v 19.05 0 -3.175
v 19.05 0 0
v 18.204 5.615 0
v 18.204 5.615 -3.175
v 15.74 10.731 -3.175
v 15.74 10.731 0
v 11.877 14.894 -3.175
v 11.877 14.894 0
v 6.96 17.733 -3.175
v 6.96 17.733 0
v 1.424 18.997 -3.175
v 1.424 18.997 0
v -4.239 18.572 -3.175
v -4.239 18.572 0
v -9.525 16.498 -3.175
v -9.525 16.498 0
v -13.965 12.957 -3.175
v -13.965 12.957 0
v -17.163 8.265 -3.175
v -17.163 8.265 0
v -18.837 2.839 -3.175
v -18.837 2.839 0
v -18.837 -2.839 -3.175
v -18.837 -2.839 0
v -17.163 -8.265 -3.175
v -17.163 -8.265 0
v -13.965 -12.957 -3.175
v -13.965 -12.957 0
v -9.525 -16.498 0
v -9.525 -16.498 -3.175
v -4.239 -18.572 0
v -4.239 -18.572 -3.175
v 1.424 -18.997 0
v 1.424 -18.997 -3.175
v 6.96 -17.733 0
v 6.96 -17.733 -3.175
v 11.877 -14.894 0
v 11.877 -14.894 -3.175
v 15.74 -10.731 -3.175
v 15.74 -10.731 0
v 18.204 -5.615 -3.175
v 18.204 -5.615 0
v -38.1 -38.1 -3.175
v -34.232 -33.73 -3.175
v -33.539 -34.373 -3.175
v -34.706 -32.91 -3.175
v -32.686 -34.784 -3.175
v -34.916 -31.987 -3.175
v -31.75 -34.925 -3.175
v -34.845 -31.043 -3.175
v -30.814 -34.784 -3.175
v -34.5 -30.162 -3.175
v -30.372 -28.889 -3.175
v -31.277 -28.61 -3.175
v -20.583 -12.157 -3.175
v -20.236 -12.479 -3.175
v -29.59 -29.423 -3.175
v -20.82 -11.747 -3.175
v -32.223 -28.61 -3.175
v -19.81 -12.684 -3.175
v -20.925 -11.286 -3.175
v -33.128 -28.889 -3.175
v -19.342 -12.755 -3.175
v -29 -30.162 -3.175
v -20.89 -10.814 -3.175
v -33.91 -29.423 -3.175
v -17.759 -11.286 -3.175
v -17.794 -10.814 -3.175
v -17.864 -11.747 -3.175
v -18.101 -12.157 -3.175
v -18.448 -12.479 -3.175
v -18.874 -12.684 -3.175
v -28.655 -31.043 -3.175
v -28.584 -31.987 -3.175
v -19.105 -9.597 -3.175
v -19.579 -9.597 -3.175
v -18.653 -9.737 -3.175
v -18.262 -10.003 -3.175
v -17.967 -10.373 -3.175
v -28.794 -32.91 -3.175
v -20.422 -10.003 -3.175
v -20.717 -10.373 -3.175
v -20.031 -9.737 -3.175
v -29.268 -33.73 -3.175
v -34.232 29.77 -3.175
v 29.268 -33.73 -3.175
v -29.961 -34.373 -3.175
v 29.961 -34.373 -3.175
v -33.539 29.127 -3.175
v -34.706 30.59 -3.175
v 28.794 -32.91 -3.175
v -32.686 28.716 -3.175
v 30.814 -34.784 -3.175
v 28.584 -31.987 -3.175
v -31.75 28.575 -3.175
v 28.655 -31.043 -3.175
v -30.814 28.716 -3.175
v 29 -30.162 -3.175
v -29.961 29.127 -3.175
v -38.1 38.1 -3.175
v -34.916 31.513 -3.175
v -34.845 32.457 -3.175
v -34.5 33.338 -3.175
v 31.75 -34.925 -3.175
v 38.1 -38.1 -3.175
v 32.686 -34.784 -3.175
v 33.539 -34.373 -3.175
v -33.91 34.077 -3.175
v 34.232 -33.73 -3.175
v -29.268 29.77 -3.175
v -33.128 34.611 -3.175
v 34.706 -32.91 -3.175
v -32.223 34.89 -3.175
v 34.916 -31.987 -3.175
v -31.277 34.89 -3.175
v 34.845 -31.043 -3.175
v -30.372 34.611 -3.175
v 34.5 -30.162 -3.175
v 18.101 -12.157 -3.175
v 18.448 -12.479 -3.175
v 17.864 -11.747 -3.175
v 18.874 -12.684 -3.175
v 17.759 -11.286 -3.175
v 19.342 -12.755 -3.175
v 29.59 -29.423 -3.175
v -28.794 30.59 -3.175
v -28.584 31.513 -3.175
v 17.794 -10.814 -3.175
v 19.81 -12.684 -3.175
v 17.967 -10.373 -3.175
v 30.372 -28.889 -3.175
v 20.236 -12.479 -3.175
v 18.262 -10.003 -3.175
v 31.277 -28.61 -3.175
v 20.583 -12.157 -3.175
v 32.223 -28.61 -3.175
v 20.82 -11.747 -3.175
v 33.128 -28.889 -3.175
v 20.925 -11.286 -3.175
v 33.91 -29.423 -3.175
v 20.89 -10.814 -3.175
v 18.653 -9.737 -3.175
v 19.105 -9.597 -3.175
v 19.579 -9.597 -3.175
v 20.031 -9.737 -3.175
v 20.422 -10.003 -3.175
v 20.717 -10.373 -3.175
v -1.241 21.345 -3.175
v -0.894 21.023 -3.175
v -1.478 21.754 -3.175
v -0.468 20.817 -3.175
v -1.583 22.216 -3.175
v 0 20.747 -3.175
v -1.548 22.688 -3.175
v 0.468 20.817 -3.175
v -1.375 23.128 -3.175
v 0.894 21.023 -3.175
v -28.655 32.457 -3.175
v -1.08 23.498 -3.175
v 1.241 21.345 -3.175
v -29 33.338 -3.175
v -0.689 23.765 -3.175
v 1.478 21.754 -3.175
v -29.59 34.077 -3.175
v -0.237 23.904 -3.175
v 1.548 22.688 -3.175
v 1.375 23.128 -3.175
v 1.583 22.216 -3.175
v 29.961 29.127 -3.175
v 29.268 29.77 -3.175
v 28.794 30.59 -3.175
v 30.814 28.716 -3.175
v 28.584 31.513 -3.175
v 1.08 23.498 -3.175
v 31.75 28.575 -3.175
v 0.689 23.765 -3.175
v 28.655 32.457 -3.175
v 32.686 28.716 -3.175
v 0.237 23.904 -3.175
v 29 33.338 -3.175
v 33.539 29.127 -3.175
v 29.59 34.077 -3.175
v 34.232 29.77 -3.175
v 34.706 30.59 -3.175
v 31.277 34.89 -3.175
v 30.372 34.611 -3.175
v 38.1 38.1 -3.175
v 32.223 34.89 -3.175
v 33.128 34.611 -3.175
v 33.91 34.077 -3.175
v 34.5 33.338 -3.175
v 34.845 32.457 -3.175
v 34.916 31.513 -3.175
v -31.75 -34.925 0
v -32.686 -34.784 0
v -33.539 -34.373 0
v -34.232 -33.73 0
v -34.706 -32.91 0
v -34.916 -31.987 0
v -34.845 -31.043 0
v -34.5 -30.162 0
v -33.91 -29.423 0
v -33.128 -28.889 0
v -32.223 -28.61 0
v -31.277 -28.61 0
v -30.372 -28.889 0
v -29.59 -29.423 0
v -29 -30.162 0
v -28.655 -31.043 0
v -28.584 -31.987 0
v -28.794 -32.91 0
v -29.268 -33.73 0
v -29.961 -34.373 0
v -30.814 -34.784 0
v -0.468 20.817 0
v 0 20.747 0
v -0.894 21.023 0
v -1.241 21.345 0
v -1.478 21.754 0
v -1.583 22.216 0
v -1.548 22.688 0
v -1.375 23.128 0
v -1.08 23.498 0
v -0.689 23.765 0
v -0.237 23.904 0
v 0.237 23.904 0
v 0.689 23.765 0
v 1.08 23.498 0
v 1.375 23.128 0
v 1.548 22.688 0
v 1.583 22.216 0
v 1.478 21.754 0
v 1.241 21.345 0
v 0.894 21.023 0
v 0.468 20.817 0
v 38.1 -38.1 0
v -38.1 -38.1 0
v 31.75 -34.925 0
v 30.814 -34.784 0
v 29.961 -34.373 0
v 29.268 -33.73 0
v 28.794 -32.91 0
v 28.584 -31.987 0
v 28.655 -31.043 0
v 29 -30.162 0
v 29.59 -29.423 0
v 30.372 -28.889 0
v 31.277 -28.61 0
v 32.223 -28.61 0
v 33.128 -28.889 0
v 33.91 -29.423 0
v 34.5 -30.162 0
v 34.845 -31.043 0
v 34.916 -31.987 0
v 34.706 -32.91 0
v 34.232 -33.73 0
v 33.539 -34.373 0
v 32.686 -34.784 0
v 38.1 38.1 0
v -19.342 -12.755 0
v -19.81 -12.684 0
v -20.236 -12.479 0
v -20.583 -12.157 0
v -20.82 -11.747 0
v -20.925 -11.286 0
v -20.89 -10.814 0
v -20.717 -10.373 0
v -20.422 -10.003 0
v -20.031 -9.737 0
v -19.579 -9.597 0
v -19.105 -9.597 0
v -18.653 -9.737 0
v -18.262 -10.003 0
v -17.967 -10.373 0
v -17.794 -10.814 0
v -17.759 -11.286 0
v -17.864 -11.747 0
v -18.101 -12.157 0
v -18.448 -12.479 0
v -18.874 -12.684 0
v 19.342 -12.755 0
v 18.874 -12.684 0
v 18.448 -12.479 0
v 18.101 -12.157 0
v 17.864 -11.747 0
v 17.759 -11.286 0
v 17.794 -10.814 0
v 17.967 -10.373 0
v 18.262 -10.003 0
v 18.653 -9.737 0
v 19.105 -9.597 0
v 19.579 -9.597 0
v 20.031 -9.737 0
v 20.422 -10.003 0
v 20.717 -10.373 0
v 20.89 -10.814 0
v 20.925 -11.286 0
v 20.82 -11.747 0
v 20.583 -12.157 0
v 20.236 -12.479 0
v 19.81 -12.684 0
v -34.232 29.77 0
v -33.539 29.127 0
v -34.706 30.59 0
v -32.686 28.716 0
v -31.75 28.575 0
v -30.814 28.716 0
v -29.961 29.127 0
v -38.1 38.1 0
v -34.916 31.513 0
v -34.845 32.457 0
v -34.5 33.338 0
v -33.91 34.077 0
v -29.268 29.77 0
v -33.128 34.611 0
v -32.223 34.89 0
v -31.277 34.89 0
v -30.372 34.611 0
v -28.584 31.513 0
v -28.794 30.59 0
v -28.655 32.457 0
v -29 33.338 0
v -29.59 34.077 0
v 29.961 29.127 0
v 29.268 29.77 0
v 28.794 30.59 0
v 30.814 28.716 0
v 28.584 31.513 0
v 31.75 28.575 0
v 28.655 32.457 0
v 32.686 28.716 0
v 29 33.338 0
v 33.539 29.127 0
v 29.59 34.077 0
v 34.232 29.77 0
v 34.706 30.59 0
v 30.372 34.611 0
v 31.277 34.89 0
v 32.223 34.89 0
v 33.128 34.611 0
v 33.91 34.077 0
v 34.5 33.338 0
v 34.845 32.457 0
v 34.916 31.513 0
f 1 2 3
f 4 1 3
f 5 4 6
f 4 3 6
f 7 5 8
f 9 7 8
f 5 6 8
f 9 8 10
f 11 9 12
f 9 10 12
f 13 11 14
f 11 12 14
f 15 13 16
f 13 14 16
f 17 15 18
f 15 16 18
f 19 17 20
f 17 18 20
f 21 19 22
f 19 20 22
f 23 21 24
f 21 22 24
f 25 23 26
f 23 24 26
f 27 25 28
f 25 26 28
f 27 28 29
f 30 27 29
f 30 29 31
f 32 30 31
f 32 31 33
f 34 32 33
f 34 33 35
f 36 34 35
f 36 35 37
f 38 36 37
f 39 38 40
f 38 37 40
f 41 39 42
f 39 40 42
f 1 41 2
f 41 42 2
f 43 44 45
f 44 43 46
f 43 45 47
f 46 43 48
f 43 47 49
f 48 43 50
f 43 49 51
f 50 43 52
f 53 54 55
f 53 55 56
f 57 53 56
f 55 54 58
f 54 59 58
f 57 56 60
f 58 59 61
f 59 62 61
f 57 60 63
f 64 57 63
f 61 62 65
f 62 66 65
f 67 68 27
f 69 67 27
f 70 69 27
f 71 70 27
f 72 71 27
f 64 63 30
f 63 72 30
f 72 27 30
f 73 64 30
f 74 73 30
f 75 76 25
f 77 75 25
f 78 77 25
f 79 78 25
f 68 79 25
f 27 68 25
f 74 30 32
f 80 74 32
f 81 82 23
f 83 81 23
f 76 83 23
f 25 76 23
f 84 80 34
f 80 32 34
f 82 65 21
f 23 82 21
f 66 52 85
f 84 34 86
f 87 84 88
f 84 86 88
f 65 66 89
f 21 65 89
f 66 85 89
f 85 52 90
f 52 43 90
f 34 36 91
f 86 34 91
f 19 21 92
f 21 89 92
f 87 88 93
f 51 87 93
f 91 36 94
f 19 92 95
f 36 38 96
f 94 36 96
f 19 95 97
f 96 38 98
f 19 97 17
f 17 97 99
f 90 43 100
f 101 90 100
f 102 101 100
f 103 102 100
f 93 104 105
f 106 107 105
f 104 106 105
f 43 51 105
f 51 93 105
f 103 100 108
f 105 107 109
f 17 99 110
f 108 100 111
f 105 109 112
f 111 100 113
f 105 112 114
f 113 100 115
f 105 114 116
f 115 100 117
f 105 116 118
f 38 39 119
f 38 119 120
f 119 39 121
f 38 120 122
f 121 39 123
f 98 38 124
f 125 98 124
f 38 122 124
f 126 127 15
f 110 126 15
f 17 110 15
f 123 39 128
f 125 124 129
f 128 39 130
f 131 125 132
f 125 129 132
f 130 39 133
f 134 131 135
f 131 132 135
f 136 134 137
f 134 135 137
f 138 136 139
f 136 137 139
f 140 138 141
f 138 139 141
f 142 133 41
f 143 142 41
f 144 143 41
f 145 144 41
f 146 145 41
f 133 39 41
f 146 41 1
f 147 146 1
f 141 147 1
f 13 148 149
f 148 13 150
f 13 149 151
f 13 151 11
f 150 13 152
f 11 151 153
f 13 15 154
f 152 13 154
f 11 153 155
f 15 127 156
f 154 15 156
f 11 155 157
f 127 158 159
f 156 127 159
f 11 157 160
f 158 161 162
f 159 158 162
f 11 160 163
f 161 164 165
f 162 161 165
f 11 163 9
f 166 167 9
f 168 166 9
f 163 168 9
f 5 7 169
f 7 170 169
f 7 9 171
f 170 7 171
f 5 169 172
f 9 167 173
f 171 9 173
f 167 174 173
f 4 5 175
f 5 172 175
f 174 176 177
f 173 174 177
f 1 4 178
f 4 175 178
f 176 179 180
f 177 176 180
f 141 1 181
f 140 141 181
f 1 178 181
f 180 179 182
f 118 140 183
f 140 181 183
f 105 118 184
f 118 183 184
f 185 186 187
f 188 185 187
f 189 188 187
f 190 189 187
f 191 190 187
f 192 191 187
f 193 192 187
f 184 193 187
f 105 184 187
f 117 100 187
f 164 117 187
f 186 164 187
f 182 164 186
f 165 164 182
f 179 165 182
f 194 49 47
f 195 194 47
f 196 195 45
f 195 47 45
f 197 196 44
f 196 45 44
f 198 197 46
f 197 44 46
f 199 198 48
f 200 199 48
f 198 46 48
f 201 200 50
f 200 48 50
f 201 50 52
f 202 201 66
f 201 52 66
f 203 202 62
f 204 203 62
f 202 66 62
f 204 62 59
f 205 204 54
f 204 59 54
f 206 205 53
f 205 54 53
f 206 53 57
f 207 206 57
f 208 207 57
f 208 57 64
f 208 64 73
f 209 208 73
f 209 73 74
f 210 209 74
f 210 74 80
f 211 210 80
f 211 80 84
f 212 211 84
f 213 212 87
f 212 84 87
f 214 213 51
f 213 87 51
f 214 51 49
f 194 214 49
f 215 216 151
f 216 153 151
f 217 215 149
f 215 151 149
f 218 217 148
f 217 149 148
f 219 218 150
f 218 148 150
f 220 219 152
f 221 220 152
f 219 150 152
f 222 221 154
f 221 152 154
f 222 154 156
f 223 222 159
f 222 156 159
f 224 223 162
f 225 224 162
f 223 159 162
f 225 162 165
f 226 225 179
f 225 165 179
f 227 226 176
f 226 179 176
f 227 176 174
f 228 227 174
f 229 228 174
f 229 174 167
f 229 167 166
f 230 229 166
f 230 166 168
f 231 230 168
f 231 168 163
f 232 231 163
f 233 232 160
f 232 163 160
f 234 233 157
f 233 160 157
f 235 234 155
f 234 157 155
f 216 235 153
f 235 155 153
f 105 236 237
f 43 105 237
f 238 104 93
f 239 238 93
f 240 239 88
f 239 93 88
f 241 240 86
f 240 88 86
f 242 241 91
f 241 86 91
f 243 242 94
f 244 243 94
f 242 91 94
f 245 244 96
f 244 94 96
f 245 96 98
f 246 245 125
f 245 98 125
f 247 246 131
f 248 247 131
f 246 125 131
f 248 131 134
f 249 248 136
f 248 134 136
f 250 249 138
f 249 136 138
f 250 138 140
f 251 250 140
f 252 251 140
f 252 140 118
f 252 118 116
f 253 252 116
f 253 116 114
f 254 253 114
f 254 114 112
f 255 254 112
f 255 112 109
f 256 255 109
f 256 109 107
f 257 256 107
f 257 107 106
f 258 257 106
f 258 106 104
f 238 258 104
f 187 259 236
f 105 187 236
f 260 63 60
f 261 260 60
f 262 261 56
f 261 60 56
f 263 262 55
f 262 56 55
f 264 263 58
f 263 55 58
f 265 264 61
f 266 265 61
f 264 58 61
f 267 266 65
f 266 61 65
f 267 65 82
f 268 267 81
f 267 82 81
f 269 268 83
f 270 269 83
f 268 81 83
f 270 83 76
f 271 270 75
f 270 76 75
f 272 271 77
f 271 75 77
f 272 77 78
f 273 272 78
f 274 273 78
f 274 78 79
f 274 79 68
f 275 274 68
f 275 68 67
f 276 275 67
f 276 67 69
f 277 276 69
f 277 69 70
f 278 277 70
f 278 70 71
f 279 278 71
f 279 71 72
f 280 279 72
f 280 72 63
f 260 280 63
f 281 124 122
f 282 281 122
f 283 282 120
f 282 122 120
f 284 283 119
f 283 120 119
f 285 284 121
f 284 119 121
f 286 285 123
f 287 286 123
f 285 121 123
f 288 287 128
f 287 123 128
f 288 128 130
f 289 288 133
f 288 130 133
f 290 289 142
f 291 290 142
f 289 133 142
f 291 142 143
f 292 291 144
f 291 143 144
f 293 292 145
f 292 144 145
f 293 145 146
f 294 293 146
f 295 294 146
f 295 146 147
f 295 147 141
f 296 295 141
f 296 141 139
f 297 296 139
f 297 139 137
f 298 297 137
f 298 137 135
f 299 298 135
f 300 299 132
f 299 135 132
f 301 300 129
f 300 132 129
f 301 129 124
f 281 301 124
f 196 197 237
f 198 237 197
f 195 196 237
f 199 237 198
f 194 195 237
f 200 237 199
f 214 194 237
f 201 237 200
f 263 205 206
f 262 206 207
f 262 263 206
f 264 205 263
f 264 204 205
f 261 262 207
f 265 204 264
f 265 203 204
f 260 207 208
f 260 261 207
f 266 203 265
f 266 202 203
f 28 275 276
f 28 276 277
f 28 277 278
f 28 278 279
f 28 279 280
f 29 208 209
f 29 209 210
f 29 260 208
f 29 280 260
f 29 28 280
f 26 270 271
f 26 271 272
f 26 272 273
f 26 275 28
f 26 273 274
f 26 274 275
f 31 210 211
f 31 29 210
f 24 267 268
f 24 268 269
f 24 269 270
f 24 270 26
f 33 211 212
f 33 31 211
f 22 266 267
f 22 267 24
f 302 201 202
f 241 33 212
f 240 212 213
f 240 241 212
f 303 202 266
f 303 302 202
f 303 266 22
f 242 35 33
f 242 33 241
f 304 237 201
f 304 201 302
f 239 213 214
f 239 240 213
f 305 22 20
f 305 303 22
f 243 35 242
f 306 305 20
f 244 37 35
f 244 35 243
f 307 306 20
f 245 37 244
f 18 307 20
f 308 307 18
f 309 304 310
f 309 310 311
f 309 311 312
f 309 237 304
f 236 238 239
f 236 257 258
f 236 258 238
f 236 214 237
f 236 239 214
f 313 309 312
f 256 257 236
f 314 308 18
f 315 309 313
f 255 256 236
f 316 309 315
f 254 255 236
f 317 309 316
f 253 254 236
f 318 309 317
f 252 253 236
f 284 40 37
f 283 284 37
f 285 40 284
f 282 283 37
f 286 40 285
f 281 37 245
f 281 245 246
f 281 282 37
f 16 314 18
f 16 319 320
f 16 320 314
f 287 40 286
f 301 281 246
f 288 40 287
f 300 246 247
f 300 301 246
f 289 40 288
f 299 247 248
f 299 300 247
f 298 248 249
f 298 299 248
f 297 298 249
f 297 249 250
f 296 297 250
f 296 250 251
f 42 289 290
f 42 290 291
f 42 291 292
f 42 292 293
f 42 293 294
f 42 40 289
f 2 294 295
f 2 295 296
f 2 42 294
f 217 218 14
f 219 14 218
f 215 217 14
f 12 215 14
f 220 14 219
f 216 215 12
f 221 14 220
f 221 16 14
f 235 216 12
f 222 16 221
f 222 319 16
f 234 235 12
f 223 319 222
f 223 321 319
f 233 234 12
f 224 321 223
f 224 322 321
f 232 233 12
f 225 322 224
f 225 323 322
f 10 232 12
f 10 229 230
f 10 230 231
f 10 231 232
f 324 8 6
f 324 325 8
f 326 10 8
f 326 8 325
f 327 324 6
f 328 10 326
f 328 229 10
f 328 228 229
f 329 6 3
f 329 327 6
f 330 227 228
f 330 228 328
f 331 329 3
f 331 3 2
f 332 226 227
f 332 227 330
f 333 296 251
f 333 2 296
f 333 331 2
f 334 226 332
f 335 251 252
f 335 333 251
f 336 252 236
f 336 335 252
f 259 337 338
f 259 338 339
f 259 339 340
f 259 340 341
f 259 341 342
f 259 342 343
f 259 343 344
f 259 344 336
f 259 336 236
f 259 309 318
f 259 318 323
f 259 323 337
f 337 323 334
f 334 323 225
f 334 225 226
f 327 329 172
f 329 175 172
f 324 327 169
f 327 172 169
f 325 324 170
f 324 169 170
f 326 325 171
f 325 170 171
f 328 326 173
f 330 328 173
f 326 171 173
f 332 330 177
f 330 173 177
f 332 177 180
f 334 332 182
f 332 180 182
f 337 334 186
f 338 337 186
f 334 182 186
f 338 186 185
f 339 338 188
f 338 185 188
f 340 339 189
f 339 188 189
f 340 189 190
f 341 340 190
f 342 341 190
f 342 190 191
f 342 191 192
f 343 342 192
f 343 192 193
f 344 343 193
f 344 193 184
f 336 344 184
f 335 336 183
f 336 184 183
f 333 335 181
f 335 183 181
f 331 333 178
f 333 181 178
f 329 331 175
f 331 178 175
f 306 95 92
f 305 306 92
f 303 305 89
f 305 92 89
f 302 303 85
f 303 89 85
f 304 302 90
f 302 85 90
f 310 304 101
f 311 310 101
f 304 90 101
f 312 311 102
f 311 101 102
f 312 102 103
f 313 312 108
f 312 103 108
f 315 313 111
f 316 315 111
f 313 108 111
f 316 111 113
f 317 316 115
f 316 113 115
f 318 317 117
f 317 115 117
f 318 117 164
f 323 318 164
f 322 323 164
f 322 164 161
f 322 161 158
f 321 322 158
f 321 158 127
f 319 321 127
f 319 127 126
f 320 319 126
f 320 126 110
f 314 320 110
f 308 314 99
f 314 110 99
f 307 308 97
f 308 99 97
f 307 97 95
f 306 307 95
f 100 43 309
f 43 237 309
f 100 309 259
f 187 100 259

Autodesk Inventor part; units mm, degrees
ref_plane "YZ Plane" through (0, 0, 0) normal (1, 0, 0) x (0, 1, 0)
ref_plane "XZ Plane" through (0, 0, 0) normal (0, 1, 0) x (-1, 0, 0)
ref_plane "XY Plane" through (0, 0, 0) normal (0, 0, 1) x (1, 0, 0)
sketch "Sketch1" plane through (0, 0, 0) normal (0, 0, 1) x (1, 0, 0)
  line L0 (-38.1, 38.1) -> (38.1, 38.1)
  line L1 (38.1, 38.1) -> (38.1, -38.1)
  line L2 (38.1, -38.1) -> (-38.1, -38.1)
  line L3 (-38.1, -38.1) -> (-38.1, 38.1)
  circle A0 centre (0, 0) radius 19.05
  point P0 (-31.75, 31.75)
  point P1 (31.75, 31.75)
  point P2 (31.75, -31.75)
  point P3 (-31.75, -31.75)
  dimension "d0" = 76.2
  dimension "d1" = 76.2
  dimension "d2" = 38.1
  dimension "d3" = 38.1
  dimension "d4" = 38.1
  dimension "d5" = 6.35
  dimension "d6" = 6.35
  dimension "d7" = 6.35
  dimension "d8" = 6.35
extrude "Extrusion1" add sketch "Sketch1" against normal blind 3.175
hole "Hole1" at (-31.75, 31.75, 0) at (31.75, 31.75, 0) at (31.75, -31.75, 0) at (-31.75, -31.75, 0) direction (0, 0, -1) diameter 6.35 end through all
sketch "Sketch2" plane through (0, 0, 0) normal (0, 0, 1) x (1, 0, 0)
  circle A0 centre (0, 0) radius 19.05 projected
  line L0 (-38.1, 38.1) -> (38.1, 38.1) projected
  line L1 (-38.1, -38.1) -> (-38.1, 38.1) projected
  line L2 (38.1, -38.1) -> (-38.1, -38.1) projected
  line L3 (38.1, 38.1) -> (38.1, -38.1) projected
  circle A1 centre (0, 0) radius 19.05 projected
  circle A2 centre (0, 0) radius 22.3343
  point P0 (0, 22.3343)
  point P1 (19.3421, -11.1672)
  point P2 (-19.3421, -11.1672)
  dimension "d19" = 38.6842
  dimension "d20" = 38.6842
  dimension "d21" = 38.6842
  dimension "d22" = 44.6687
  dimension "d24" = 38.1
hole "Hole2" at (0, 22.3343, 0) at (19.3421, -11.1672, 0) at (-19.3421, -11.1672, 0) direction (0, 0, -1) diameter 3.175 end through all
equation "\"d2\" = 0.5 * d1"
equation "\"d3\" = 0.5 * d0"
equation "\"d7\" = d6"
equation "\"d8\" = d5"
equation "\"d20\" = d19"
equation "\"d21\" = d19"
equation "\"d24\" = 0.5 * d1"
properties part number "Top Plate BD Motor mount"
